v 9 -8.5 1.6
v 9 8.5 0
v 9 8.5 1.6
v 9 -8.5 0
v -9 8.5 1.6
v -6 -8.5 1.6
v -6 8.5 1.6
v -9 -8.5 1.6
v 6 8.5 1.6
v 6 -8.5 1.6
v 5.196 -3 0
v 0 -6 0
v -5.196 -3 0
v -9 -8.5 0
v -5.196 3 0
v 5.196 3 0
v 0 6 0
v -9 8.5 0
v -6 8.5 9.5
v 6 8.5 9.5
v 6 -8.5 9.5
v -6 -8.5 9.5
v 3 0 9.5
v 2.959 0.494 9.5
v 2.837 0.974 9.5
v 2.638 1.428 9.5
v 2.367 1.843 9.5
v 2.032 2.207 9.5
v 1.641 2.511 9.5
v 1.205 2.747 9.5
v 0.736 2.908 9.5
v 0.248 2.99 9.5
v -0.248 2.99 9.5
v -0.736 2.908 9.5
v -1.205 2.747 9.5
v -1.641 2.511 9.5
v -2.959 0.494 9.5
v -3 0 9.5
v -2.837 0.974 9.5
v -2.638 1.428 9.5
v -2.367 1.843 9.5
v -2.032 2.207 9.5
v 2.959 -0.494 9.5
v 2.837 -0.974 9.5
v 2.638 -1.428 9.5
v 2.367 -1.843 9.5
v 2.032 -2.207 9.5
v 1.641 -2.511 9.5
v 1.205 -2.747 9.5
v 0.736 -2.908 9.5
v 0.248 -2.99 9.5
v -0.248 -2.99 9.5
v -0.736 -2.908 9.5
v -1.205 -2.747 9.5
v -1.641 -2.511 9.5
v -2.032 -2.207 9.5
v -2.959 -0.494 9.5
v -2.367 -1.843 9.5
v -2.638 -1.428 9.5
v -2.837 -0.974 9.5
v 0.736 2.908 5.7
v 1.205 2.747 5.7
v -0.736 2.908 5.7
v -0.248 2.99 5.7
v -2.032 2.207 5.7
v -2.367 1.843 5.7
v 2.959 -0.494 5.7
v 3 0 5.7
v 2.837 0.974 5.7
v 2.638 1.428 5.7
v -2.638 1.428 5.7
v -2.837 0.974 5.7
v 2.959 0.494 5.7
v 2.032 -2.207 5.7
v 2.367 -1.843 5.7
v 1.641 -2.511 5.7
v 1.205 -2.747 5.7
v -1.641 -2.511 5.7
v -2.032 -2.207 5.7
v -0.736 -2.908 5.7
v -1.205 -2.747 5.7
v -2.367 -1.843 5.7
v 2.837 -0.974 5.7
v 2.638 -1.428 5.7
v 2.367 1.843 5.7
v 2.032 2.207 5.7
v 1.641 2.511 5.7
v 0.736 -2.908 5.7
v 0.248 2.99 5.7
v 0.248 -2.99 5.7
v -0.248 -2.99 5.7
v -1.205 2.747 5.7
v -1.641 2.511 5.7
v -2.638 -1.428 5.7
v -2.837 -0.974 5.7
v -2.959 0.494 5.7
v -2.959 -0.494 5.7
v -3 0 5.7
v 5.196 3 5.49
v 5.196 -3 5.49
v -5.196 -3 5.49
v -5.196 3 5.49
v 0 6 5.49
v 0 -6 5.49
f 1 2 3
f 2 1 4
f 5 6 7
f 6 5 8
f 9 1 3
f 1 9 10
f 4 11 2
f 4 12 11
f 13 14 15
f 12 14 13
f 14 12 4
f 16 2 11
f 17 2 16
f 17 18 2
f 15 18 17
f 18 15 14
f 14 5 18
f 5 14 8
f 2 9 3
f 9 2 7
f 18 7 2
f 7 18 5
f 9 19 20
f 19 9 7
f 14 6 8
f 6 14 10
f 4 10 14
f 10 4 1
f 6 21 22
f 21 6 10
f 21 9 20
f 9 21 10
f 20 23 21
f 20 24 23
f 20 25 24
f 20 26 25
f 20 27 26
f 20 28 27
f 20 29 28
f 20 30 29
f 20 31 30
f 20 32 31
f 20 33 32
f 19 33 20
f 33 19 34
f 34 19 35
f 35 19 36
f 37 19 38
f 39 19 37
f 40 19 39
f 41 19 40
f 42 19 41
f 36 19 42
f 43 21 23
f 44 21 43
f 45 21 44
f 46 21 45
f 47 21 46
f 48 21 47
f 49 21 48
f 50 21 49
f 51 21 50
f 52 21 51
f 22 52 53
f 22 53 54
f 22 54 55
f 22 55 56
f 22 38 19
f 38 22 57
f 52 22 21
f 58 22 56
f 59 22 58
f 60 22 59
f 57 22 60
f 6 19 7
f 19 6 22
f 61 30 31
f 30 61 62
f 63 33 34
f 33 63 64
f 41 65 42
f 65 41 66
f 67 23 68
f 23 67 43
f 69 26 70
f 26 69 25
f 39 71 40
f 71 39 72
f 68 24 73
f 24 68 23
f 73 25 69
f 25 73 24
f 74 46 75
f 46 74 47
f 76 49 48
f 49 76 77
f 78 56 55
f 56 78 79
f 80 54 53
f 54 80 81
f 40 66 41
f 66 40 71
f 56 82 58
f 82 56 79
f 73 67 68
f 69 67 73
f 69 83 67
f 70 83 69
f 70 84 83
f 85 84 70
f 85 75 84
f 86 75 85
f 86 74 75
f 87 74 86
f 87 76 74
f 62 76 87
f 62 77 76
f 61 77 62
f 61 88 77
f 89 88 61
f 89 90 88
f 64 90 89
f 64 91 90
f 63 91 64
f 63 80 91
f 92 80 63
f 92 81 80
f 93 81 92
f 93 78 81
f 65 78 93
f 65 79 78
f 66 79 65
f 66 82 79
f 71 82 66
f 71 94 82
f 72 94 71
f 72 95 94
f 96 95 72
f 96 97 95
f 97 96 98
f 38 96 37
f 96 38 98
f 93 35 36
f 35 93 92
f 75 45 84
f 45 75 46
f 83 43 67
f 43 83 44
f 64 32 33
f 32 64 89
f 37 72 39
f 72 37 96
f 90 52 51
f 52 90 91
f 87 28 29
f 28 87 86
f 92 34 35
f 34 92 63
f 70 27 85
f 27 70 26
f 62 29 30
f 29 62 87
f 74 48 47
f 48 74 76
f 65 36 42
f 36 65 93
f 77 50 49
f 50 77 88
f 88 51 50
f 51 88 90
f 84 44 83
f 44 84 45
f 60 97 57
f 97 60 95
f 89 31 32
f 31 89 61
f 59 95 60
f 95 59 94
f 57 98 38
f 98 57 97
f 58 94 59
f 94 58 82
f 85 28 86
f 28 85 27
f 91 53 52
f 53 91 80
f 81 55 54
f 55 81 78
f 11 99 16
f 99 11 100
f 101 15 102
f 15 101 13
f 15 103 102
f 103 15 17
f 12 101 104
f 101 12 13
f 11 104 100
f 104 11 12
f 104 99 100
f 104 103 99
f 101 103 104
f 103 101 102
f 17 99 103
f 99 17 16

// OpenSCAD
$fa=1/1;
$fs=1/2;
bissl=1/100;
shoe_narrow=12;
shoe_wide=18;
shoe_depth=17;
shoe_thickness=1.6;
thread=6;
hex=12;
nut_h=5.5;
wall=4;
layer=0.2;
difference() {
  union() {
    translate([-shoe_wide/2,-shoe_depth/2,0])cube([shoe_wide,shoe_depth,shoe_thickness]);
    translate([-shoe_narrow/2,-shoe_depth/2,shoe_thickness]) cube([shoe_narrow,shoe_depth,nut_h+wall-shoe_thickness]);
  }
  translate([0,0,nut_h+layer])cylinder(d=thread, h=wall);
  rotate([0,0,90])translate([0,0,-bissl])cylinder(d=hex, h=nut_h,$fn=6);
}
